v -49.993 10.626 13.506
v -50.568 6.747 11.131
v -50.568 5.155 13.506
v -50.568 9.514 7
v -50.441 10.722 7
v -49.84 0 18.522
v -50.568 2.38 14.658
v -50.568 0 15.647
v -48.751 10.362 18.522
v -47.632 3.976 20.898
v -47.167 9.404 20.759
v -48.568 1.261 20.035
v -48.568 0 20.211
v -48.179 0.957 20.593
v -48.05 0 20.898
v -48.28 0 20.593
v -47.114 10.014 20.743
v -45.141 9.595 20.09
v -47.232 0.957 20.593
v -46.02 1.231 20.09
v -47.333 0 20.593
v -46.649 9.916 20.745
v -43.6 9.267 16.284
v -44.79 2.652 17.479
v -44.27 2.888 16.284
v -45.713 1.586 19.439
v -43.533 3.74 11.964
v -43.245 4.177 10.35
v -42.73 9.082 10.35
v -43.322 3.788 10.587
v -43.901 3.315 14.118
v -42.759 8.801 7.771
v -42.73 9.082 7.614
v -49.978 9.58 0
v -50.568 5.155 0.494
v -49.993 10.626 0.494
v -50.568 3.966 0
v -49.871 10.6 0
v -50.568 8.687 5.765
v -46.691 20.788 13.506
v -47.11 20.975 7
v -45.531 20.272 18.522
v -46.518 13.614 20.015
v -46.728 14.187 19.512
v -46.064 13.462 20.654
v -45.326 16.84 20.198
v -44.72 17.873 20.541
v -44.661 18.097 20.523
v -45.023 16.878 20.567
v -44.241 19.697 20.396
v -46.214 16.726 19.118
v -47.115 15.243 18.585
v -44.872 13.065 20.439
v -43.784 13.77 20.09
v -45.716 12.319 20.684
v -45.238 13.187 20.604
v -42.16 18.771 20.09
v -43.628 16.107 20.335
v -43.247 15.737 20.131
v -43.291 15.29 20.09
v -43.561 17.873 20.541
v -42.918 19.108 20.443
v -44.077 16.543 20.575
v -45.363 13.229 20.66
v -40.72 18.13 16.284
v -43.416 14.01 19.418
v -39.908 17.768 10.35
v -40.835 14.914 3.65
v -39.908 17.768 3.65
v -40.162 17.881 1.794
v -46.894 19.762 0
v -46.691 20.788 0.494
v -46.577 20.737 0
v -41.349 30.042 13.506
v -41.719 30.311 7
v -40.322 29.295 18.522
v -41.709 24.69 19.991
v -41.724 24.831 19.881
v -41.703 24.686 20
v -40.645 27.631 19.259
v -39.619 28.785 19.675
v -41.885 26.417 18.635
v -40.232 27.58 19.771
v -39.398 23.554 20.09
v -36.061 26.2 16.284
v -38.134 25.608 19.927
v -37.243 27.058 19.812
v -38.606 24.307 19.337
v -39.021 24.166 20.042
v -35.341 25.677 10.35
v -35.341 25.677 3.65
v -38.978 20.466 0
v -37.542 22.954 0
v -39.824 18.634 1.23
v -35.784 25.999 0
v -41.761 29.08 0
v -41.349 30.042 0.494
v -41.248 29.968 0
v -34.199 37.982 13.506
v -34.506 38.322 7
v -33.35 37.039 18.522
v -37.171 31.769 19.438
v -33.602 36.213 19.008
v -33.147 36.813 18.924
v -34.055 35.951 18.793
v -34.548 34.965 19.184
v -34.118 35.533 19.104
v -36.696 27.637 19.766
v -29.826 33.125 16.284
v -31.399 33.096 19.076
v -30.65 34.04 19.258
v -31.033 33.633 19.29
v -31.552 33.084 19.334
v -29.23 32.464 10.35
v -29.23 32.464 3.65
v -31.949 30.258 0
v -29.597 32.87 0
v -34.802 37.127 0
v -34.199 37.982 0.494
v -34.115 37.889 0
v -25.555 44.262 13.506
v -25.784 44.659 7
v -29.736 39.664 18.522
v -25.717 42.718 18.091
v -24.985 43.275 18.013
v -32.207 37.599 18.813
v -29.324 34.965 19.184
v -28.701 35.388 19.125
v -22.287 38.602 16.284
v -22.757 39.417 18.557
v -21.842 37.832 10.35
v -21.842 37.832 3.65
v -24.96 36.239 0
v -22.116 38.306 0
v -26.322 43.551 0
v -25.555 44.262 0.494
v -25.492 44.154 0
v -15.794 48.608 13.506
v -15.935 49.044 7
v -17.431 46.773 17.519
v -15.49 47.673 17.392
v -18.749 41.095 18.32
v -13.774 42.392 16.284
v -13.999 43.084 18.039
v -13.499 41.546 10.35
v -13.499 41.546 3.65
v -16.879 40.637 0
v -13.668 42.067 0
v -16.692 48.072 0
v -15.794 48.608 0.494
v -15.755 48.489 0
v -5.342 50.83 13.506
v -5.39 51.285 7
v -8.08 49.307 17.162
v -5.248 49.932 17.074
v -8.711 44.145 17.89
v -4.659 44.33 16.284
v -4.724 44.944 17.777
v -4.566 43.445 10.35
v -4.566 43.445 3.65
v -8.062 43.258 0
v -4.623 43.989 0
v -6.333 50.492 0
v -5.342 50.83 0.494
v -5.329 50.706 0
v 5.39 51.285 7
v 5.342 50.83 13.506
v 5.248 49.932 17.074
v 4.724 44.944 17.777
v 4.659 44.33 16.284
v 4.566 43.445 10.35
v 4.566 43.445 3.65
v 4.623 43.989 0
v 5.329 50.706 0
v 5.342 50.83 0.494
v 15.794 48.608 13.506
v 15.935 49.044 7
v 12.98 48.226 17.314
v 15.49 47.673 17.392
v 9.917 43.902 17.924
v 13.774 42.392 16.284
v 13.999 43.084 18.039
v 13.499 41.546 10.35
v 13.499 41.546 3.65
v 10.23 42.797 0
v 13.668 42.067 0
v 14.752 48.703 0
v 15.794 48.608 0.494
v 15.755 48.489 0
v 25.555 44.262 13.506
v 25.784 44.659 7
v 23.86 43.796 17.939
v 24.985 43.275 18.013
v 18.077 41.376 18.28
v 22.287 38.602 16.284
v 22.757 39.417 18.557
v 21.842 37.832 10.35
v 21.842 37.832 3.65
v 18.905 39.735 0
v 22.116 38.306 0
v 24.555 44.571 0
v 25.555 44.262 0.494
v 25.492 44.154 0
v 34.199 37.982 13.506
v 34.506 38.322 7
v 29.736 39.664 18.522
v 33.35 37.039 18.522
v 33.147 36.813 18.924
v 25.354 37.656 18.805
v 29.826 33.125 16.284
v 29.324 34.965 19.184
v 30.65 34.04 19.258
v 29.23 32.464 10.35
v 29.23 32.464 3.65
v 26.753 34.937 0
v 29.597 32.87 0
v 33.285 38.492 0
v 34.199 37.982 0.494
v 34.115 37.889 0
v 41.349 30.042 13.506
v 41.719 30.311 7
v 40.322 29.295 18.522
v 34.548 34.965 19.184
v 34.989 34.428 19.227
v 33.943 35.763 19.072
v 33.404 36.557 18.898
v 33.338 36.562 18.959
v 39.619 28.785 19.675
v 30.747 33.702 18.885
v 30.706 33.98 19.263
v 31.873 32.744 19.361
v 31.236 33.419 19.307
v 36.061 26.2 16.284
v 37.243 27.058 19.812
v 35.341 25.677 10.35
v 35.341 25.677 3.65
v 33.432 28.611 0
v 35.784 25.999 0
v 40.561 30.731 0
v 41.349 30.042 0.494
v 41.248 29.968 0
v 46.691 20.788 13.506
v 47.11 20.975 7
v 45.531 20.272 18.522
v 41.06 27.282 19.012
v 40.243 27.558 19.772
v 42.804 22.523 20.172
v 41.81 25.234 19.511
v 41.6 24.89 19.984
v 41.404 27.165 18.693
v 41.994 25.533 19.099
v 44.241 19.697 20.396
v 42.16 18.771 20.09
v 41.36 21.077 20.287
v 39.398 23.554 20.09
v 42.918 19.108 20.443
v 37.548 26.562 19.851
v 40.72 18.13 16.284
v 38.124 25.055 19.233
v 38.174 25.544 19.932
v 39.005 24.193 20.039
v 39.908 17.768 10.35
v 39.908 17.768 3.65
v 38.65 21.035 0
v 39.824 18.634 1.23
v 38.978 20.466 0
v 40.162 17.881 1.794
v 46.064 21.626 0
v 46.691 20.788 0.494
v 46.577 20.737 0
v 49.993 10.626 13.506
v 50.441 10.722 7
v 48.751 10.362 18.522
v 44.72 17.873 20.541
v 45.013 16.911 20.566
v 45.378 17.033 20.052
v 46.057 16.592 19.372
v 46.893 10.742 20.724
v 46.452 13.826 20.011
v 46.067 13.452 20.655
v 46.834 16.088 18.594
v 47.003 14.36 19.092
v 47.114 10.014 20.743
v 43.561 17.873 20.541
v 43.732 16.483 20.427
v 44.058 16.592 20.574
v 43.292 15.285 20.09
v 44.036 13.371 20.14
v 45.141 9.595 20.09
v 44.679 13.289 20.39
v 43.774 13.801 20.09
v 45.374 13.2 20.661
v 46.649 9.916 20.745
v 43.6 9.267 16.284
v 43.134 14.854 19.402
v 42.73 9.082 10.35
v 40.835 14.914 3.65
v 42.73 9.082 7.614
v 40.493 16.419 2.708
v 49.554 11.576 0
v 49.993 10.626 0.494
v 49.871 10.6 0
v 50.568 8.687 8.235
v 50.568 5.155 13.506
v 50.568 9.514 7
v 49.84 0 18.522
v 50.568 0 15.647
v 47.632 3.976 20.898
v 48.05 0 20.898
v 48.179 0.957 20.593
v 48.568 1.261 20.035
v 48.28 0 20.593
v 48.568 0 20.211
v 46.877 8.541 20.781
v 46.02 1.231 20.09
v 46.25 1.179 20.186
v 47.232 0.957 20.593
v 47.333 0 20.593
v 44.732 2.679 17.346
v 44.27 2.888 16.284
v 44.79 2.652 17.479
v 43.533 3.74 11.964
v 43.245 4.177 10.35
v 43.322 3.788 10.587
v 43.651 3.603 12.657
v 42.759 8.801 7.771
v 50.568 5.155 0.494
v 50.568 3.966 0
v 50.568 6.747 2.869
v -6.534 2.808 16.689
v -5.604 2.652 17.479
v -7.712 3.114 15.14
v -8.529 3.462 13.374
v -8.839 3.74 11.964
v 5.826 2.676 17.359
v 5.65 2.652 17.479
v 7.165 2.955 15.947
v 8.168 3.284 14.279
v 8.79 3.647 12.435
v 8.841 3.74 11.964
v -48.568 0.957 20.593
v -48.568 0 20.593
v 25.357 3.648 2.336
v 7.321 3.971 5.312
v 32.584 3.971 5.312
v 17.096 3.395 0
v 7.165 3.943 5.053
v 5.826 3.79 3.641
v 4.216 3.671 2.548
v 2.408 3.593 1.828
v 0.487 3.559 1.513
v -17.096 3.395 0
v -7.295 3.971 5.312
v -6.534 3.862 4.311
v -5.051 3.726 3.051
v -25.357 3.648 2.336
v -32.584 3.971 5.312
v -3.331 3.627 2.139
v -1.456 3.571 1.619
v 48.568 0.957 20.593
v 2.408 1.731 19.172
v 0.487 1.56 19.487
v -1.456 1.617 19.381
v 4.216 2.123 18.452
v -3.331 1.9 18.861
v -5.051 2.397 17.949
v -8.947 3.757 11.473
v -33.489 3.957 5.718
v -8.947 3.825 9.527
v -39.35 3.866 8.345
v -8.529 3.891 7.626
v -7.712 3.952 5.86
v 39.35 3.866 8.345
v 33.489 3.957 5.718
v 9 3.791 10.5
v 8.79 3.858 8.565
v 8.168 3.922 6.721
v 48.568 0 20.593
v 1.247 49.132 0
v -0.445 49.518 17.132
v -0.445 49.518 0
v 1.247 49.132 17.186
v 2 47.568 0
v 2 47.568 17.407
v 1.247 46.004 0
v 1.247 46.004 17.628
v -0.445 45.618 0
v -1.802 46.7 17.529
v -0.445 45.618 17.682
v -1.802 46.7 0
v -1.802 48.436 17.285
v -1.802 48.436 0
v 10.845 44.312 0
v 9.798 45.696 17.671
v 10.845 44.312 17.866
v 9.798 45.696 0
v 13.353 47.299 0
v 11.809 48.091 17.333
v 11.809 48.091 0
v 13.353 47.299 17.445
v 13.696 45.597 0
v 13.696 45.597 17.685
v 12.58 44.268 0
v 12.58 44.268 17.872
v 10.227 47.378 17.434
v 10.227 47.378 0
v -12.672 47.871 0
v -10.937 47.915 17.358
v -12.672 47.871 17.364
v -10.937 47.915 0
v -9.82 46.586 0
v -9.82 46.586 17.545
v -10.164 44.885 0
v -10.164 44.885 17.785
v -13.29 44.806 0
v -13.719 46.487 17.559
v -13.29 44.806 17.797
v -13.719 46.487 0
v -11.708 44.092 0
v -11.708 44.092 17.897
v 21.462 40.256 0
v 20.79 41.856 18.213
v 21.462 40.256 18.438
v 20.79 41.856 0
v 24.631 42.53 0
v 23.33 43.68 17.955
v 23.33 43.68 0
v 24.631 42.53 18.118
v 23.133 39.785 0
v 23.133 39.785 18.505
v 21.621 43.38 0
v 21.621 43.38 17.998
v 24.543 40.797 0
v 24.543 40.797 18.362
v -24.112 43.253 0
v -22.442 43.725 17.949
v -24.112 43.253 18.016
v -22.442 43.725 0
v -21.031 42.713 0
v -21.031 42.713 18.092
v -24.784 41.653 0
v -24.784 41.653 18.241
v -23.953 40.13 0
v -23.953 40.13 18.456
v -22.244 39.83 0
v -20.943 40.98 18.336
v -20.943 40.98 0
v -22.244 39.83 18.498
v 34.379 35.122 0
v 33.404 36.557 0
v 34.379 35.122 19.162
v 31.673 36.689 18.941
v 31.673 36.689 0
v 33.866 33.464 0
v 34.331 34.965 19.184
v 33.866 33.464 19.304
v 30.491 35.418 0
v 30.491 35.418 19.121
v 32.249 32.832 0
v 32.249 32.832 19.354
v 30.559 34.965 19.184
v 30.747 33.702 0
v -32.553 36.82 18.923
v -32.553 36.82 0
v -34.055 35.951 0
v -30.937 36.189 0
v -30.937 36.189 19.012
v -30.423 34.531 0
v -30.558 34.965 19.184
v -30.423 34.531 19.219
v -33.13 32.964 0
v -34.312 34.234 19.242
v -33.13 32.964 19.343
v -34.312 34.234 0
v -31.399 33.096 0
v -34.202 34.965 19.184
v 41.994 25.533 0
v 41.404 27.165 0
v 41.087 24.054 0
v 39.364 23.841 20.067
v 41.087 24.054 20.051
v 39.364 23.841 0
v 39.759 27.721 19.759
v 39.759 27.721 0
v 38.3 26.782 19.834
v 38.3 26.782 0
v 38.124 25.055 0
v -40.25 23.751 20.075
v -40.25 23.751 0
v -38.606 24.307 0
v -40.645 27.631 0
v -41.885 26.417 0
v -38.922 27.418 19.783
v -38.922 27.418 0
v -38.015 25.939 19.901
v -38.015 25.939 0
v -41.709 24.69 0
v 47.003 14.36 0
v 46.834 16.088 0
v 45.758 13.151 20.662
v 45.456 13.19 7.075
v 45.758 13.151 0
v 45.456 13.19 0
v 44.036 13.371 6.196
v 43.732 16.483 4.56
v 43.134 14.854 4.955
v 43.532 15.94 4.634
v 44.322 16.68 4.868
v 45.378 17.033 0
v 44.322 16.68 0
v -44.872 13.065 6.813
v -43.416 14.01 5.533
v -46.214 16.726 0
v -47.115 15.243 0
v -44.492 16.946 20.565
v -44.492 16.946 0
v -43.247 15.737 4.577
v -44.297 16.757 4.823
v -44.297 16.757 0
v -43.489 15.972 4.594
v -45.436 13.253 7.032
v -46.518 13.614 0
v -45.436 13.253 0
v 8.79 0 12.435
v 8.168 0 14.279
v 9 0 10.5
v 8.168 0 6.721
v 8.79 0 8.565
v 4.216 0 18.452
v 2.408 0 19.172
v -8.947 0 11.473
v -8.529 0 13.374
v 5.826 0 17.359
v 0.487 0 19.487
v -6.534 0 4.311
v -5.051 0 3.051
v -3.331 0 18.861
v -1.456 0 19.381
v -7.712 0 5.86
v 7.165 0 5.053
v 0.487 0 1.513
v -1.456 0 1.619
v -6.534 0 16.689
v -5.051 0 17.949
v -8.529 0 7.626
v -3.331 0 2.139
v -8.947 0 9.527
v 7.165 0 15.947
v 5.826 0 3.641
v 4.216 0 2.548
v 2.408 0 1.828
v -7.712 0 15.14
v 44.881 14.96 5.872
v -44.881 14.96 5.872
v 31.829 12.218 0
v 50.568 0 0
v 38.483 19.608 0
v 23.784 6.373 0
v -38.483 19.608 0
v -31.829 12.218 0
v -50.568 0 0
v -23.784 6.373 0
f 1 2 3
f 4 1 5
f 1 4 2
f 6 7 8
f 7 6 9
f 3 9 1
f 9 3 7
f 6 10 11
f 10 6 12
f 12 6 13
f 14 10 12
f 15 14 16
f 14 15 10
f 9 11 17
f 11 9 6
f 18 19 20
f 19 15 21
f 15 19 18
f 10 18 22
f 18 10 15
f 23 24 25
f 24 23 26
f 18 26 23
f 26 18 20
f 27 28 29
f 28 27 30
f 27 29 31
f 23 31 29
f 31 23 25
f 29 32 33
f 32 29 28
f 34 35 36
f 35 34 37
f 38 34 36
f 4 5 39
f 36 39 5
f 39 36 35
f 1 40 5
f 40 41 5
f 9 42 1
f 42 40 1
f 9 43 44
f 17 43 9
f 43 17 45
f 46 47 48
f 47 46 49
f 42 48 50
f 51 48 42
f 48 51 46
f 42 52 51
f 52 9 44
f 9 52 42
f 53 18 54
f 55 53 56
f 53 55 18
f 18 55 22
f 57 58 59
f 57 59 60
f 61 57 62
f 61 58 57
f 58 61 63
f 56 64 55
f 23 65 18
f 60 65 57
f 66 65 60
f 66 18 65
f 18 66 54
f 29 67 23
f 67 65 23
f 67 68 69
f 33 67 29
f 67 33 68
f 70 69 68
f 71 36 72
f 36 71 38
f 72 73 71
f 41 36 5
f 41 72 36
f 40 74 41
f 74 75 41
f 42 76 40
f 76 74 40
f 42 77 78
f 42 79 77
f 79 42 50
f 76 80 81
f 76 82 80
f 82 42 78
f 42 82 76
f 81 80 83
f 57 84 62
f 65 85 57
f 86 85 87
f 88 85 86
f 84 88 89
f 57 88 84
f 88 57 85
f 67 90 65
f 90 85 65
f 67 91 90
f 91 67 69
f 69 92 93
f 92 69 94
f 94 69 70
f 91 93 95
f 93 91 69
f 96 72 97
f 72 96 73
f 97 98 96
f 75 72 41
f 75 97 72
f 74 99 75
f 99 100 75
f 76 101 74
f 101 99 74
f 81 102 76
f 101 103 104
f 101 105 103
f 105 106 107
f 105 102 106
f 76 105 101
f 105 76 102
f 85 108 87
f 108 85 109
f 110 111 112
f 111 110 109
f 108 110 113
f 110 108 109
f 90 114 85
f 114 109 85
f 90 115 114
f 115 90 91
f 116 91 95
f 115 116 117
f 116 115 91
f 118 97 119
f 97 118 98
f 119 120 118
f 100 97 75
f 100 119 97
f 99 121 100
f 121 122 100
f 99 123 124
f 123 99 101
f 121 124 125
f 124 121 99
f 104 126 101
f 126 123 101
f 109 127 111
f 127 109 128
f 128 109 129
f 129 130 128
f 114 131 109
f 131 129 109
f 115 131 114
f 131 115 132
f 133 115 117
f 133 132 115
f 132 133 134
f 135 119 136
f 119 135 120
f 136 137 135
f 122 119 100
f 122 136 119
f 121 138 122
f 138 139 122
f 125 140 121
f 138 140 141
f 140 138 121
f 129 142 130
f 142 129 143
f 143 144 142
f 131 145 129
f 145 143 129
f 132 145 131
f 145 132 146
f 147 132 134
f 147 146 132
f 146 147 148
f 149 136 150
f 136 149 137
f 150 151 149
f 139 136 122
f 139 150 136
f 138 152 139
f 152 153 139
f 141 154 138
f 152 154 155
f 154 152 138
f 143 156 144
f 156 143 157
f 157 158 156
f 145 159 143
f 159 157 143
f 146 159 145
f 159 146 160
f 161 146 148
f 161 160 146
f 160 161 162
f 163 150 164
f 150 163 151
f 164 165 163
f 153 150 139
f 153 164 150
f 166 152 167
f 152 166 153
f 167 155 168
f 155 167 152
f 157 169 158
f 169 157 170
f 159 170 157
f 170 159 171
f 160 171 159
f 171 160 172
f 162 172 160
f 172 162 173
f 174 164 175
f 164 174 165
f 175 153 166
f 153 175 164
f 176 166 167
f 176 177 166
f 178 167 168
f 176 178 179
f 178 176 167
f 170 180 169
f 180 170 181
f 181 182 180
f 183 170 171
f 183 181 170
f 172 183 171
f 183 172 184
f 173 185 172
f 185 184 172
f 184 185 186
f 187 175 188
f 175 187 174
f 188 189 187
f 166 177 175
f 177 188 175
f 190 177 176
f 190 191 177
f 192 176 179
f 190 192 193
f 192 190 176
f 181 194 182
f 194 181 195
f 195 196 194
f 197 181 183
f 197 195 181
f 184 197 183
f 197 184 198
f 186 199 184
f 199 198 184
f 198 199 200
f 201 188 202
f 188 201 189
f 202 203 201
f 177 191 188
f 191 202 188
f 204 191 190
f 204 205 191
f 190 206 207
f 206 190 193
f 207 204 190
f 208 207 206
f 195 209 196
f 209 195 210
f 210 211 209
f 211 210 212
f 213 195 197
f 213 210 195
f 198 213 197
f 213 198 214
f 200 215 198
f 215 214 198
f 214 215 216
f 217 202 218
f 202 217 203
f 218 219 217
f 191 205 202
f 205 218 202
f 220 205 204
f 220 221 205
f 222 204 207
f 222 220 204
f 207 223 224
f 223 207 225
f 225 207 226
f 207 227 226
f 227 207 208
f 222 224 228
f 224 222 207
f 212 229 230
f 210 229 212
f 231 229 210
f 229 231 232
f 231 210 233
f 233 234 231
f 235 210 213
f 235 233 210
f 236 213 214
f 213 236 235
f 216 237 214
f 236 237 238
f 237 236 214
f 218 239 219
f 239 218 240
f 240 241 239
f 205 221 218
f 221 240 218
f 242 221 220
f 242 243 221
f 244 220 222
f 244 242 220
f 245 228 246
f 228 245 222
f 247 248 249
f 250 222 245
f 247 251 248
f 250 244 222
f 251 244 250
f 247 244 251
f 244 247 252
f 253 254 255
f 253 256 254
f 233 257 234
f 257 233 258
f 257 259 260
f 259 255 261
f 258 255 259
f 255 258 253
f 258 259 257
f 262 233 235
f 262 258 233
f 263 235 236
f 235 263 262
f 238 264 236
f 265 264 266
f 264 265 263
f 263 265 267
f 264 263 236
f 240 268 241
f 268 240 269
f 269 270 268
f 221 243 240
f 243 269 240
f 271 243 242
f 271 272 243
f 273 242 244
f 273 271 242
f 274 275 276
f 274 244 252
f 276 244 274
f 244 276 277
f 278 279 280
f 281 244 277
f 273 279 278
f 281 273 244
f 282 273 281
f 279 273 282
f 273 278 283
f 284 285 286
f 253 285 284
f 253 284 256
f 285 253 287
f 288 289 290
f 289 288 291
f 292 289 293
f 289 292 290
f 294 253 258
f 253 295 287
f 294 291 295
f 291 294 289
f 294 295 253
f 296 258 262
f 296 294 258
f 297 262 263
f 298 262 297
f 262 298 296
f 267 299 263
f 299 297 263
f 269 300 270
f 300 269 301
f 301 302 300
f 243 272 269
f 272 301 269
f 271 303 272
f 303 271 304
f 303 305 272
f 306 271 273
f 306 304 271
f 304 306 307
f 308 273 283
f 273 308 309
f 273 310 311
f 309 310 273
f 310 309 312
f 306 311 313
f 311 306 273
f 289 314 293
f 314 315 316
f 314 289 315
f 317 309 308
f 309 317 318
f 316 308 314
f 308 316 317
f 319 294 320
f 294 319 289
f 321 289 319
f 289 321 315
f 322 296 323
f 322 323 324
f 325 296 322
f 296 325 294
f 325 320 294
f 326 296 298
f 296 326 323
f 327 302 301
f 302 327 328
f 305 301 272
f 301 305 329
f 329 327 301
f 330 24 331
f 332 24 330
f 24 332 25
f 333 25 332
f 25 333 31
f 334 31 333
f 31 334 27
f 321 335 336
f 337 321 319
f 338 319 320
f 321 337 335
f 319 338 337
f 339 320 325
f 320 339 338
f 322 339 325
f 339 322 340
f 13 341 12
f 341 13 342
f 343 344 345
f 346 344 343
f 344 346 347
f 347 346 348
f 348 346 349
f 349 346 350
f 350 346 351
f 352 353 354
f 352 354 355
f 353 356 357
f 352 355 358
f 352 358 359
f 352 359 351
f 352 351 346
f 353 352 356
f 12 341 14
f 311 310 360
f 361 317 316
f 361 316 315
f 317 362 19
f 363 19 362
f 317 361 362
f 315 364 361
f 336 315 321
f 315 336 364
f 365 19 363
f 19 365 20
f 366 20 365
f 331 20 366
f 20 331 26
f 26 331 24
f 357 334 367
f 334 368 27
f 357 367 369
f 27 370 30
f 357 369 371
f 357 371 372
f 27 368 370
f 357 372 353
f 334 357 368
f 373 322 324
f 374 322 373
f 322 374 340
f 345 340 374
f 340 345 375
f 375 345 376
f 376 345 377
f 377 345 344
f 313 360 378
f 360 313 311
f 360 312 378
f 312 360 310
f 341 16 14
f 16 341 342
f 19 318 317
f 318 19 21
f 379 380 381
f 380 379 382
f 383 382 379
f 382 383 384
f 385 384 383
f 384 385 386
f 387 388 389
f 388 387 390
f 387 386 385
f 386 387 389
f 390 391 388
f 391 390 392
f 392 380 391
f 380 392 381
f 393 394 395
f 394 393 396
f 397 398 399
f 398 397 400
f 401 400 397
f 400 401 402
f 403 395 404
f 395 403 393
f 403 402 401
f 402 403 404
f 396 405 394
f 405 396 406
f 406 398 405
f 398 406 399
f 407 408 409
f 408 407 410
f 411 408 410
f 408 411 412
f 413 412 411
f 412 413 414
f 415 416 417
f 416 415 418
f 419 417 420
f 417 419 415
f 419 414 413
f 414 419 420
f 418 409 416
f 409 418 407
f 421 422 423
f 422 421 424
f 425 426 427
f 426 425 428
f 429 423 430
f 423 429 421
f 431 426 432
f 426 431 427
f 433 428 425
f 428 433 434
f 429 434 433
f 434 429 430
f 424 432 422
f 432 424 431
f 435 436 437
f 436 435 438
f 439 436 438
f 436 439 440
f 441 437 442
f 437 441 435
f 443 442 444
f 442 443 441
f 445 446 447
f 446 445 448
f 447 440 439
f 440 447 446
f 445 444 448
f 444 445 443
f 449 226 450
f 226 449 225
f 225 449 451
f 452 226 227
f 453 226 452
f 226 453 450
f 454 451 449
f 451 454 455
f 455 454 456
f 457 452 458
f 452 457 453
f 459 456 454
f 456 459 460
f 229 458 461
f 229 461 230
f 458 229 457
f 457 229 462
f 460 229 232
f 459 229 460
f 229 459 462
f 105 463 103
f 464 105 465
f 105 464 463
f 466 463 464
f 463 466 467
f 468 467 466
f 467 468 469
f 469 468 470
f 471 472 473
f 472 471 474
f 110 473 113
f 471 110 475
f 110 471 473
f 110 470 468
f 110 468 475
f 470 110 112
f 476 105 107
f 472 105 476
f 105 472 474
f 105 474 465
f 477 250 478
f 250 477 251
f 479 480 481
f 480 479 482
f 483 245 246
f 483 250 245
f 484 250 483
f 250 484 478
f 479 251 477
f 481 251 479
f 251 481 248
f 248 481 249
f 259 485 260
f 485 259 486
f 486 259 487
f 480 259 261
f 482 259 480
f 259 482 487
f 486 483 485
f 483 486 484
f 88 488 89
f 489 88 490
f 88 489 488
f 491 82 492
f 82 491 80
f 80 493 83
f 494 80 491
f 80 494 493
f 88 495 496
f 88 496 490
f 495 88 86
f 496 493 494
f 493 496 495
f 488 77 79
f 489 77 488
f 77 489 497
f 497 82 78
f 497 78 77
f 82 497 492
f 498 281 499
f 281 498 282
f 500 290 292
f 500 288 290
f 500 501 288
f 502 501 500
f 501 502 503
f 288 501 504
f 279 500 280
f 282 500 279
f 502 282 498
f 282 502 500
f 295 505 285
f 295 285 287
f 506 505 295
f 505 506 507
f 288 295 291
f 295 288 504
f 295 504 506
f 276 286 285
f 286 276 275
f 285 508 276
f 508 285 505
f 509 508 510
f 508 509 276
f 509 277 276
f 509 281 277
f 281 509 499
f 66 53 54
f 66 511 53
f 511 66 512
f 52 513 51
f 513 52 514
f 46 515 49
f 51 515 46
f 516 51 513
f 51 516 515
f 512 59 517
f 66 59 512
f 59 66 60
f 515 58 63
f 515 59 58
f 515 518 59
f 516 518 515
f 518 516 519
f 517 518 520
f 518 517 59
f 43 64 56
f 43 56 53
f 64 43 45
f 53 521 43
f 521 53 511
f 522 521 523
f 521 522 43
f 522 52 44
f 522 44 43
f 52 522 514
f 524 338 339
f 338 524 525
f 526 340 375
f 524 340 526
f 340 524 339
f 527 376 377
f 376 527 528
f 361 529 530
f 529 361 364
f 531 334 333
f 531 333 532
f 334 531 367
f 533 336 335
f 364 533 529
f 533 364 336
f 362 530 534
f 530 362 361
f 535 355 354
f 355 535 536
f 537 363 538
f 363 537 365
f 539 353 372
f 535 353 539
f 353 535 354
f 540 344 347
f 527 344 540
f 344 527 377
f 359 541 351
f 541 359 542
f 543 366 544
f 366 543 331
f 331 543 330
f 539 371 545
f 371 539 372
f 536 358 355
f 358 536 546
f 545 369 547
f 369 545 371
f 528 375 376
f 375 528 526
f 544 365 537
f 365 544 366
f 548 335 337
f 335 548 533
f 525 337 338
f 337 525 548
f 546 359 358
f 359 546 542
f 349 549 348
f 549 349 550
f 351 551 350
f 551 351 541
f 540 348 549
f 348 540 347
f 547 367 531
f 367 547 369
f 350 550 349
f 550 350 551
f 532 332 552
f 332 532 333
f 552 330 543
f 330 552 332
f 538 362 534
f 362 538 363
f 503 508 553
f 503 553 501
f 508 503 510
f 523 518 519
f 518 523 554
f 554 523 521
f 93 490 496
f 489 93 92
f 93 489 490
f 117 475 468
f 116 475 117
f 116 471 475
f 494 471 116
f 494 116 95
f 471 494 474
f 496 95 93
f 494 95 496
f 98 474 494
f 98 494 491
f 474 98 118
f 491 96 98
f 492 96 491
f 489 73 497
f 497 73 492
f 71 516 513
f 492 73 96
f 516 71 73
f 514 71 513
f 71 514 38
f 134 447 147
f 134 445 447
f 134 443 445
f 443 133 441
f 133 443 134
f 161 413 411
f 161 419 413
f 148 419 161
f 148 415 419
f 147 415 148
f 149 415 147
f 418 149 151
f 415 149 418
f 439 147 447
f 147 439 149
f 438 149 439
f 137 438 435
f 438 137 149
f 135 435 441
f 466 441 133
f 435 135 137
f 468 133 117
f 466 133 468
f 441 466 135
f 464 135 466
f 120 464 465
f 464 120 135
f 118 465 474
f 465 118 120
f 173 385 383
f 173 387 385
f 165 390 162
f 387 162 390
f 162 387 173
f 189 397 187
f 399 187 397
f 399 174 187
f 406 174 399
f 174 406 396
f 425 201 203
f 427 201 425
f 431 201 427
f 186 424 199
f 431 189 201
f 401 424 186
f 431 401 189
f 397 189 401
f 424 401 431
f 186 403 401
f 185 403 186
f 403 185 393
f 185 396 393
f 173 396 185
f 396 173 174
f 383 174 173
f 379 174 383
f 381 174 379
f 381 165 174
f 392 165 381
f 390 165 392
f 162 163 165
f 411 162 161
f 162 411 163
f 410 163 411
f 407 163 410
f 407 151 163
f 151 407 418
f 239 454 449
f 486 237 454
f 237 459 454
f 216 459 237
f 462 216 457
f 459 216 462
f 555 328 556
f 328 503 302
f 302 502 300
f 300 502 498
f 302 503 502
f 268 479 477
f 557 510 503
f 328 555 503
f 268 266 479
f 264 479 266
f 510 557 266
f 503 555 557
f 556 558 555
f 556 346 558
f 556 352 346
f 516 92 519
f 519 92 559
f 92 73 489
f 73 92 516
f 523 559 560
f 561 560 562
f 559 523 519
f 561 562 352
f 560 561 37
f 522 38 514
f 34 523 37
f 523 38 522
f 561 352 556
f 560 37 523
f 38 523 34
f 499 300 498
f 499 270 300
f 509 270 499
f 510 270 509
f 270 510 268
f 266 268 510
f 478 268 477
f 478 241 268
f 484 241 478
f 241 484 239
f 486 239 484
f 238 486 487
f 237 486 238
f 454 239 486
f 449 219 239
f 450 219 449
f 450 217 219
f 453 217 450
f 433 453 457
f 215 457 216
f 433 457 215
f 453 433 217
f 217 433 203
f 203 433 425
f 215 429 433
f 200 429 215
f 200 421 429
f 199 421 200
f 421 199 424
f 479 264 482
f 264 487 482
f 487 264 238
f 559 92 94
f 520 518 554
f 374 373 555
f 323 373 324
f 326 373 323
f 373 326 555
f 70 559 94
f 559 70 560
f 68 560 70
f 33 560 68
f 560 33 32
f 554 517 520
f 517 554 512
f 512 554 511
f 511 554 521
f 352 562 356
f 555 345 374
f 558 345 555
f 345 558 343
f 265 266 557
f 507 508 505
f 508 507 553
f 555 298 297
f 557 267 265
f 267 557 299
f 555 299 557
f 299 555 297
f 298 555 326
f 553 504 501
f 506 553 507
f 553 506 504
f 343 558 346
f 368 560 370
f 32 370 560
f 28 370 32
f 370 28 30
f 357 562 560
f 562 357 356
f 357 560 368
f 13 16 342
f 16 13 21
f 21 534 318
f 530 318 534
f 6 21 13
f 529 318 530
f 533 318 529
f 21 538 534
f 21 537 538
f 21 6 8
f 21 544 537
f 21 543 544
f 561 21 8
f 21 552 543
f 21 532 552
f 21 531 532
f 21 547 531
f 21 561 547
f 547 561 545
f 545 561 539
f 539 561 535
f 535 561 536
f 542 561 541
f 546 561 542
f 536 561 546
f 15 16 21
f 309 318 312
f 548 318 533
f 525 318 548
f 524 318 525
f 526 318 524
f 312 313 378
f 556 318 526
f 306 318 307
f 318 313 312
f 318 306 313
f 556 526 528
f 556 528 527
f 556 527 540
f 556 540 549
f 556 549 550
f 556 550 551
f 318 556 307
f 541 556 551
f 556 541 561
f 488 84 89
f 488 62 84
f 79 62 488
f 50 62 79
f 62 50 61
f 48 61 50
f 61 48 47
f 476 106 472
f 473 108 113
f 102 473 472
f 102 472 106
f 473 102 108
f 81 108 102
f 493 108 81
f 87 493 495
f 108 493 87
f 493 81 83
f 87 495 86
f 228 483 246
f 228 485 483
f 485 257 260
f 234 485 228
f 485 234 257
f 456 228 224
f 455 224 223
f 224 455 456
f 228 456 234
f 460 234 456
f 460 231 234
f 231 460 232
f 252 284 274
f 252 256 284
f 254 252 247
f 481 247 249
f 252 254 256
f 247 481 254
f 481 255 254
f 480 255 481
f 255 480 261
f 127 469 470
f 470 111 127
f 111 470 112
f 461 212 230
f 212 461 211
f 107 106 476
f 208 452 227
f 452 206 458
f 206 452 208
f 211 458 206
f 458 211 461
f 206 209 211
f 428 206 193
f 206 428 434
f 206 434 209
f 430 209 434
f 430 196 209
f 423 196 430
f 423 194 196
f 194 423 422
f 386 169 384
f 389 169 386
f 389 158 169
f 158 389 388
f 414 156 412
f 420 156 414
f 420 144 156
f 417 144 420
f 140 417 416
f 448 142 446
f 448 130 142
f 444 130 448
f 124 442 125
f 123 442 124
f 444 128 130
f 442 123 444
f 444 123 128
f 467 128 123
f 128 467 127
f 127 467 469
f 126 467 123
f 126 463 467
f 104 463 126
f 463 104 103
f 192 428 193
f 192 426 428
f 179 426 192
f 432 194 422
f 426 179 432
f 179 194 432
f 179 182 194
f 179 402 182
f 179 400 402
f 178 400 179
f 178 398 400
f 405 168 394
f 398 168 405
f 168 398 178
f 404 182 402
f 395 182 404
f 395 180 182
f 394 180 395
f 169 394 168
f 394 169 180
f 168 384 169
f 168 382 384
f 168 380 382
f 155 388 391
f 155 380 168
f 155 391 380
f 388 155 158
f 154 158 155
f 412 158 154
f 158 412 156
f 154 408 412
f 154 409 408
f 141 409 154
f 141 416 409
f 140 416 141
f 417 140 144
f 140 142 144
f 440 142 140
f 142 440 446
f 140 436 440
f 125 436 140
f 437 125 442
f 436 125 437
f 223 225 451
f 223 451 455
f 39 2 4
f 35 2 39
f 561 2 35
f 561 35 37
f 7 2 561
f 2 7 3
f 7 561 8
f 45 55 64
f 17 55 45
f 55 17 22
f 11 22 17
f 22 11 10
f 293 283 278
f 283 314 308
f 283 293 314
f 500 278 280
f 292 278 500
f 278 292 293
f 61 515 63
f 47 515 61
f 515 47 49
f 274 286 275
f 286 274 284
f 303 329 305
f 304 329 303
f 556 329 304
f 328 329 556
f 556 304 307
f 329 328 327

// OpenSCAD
// file: ../lib/rounded_box.scad
//
//  Copyright (C) 01-04-2012 Jasper den Ouden.
//
//  This is free software: you can redistribute it and/or modify
//  it under the terms of the GNU General Public License as published
//  by the Free Software Foundation, either version 3 of the License, or
//  (at your option) any later version.
//

module sph_cyl(r,h, x,y)
{ sphere(r);
  cylinder(r=r,h= h-2*r);
  translate([0,0,h-2*r]) sphere(r);
  if(x > 0)
  { rotate(v=[0,1,0],a=90) cylinder(r=r,h=x);
    translate([0,0,h-2*r]) rotate(v=[0,1,0],a=90) cylinder(r=r,h=x);
  } else {
    rotate(v=[0,1,0],a=-90) cylinder(r=r,h=-x);
    translate([0,0,h-2*r]) rotate(v=[0,1,0],a=-90) cylinder(r=r,h=-x);
  }
  if(y > 0)
  { rotate(v=[1,0,0],a=90) cylinder(r=r,h=y);
    translate([0,0,h-2*r]) rotate(v=[1,0,0],a=90) cylinder(r=r,h=y);
  } else {
    rotate(v=[1,0,0],a=-90) cylinder(r=r,h=-y);
    translate([0,0,h-2*r]) rotate(v=[1,0,0],a=-90) cylinder(r=r,h=-y);
  }
}

module rounded_rect(w,l,r)
{
    r = (2*r> w ? w/2 : r);
    translate([r,0]) square([w-2*r, l]);
    translate([0,r]) square([w, l-2*r]);
    
    translate([r,   r])   circle(r);
    translate([w-r, r])   circle(r);
    translate([r,   l-r]) circle(r);
    translate([w-r, l-r]) circle(r);
}


//If only minkowski was fast.
module rounded_cube(w,l,h,r)
{
    translate([r,r]) cube([w-2*r,l-2*r,h]);
    translate([0,r,r]) cube([w,l-2*r,h-2*r]);
    translate([r,0,r]) cube([w-2*r,l,h-2*r]);

    translate([r,r,r]) sph_cyl(r,h, w-2*r,0);
    translate([r,l-r,r]) sph_cyl(r,h, w-2*r,l-2*r);
    translate([w-r,r,r]) sph_cyl(r,h, 0,-l+2*r);
    translate([w-r,l-r,r]) sph_cyl(r,h, 0,0);
}

//rounded_box(40,40,80,10);
// main file
//
//  Copyright (C) 11-04-2012 Jasper den Ouden.
//
//  This is free software: you can redistribute it and/or modify
//  it under the terms of the GNU General Public License as published
//  by the Free Software Foundation, either version 3 of the License, or
//  (at your option) any later version.
//

//Note: only really suitable for mh<t;

use<../lib/rounded_box.scad>

cl= 260; //circumference.

pi=3.141592653589793;
r= cl/(2+pi);

echo(2*r);

fd = 25; //Distance between 'feature-adding holes'
fr = 2;

t= 6;   //Thickness of walls.

mr = 9;   //Radius of embedded magnets.(Get it right!)
mh = t; //.. height

h = max(2*mr+t/2, 2*t); //Calculated height

inf=2*(h+r);

skimmer=true;

module magnet_hole()
{   rotate([90,0]) translate([0,h/2,-mh]) cylinder(r=mr,h=2*mh); }

module feature_hole()
{
    translate([0,r-t/2]) cylinder(r=fr, h=3*h);
//    translate([0,r-2*t,h+1.2*t]) rotate([-90,0]) 
//        scale([1/8,h/(4*fd)]) cylinder(r=fd, h=3*h);
}

module bag_holder()
{

//2*r^2 *(1-cos(da)) = fd^2
// 1-cos(da) = (fd/r)^2/2
    da = acos(1-fd*fd/(2*r*r));
    intersection()
    {   union()
        {   difference()
            {   scale([1,1,h/t]) translate([0,0,t/3]) union()
                {   rotate_extrude() translate([r-t/2,0]) circle(2*t/3);
                    translate([t/3-r,0]) rotate([0,90]) cylinder(r=2*t/3, h=2*(r-t/3));
                }
                magnet_hole();
                translate([0,0,-h]) for( a=[0 : da/2 : 80] )
                {   rotate(-a) feature_hole();
                    rotate(+a) feature_hole();
                }
            }
            difference()
            {   cylinder(r=r-t/2, h=h);
                translate([0,r-t/2]) if( skimmer )
                {   cylinder(r1=r-t/2,r2=3*r/2, h=h); }
                else //TODO this kindah ugly
                {   cylinder(r=sqrt(2)*(r-t/2)-1.2*t, h=h); }
            }
        }
        translate([0,inf,inf]) cube(2*[inf,inf,inf], center=true);
        translate([r,0]) scale([1,1,h/(1.7*r)]) rotate([0,-90]) cylinder(r=1.7*r,h=2*r);
    }
}

bag_holder();
